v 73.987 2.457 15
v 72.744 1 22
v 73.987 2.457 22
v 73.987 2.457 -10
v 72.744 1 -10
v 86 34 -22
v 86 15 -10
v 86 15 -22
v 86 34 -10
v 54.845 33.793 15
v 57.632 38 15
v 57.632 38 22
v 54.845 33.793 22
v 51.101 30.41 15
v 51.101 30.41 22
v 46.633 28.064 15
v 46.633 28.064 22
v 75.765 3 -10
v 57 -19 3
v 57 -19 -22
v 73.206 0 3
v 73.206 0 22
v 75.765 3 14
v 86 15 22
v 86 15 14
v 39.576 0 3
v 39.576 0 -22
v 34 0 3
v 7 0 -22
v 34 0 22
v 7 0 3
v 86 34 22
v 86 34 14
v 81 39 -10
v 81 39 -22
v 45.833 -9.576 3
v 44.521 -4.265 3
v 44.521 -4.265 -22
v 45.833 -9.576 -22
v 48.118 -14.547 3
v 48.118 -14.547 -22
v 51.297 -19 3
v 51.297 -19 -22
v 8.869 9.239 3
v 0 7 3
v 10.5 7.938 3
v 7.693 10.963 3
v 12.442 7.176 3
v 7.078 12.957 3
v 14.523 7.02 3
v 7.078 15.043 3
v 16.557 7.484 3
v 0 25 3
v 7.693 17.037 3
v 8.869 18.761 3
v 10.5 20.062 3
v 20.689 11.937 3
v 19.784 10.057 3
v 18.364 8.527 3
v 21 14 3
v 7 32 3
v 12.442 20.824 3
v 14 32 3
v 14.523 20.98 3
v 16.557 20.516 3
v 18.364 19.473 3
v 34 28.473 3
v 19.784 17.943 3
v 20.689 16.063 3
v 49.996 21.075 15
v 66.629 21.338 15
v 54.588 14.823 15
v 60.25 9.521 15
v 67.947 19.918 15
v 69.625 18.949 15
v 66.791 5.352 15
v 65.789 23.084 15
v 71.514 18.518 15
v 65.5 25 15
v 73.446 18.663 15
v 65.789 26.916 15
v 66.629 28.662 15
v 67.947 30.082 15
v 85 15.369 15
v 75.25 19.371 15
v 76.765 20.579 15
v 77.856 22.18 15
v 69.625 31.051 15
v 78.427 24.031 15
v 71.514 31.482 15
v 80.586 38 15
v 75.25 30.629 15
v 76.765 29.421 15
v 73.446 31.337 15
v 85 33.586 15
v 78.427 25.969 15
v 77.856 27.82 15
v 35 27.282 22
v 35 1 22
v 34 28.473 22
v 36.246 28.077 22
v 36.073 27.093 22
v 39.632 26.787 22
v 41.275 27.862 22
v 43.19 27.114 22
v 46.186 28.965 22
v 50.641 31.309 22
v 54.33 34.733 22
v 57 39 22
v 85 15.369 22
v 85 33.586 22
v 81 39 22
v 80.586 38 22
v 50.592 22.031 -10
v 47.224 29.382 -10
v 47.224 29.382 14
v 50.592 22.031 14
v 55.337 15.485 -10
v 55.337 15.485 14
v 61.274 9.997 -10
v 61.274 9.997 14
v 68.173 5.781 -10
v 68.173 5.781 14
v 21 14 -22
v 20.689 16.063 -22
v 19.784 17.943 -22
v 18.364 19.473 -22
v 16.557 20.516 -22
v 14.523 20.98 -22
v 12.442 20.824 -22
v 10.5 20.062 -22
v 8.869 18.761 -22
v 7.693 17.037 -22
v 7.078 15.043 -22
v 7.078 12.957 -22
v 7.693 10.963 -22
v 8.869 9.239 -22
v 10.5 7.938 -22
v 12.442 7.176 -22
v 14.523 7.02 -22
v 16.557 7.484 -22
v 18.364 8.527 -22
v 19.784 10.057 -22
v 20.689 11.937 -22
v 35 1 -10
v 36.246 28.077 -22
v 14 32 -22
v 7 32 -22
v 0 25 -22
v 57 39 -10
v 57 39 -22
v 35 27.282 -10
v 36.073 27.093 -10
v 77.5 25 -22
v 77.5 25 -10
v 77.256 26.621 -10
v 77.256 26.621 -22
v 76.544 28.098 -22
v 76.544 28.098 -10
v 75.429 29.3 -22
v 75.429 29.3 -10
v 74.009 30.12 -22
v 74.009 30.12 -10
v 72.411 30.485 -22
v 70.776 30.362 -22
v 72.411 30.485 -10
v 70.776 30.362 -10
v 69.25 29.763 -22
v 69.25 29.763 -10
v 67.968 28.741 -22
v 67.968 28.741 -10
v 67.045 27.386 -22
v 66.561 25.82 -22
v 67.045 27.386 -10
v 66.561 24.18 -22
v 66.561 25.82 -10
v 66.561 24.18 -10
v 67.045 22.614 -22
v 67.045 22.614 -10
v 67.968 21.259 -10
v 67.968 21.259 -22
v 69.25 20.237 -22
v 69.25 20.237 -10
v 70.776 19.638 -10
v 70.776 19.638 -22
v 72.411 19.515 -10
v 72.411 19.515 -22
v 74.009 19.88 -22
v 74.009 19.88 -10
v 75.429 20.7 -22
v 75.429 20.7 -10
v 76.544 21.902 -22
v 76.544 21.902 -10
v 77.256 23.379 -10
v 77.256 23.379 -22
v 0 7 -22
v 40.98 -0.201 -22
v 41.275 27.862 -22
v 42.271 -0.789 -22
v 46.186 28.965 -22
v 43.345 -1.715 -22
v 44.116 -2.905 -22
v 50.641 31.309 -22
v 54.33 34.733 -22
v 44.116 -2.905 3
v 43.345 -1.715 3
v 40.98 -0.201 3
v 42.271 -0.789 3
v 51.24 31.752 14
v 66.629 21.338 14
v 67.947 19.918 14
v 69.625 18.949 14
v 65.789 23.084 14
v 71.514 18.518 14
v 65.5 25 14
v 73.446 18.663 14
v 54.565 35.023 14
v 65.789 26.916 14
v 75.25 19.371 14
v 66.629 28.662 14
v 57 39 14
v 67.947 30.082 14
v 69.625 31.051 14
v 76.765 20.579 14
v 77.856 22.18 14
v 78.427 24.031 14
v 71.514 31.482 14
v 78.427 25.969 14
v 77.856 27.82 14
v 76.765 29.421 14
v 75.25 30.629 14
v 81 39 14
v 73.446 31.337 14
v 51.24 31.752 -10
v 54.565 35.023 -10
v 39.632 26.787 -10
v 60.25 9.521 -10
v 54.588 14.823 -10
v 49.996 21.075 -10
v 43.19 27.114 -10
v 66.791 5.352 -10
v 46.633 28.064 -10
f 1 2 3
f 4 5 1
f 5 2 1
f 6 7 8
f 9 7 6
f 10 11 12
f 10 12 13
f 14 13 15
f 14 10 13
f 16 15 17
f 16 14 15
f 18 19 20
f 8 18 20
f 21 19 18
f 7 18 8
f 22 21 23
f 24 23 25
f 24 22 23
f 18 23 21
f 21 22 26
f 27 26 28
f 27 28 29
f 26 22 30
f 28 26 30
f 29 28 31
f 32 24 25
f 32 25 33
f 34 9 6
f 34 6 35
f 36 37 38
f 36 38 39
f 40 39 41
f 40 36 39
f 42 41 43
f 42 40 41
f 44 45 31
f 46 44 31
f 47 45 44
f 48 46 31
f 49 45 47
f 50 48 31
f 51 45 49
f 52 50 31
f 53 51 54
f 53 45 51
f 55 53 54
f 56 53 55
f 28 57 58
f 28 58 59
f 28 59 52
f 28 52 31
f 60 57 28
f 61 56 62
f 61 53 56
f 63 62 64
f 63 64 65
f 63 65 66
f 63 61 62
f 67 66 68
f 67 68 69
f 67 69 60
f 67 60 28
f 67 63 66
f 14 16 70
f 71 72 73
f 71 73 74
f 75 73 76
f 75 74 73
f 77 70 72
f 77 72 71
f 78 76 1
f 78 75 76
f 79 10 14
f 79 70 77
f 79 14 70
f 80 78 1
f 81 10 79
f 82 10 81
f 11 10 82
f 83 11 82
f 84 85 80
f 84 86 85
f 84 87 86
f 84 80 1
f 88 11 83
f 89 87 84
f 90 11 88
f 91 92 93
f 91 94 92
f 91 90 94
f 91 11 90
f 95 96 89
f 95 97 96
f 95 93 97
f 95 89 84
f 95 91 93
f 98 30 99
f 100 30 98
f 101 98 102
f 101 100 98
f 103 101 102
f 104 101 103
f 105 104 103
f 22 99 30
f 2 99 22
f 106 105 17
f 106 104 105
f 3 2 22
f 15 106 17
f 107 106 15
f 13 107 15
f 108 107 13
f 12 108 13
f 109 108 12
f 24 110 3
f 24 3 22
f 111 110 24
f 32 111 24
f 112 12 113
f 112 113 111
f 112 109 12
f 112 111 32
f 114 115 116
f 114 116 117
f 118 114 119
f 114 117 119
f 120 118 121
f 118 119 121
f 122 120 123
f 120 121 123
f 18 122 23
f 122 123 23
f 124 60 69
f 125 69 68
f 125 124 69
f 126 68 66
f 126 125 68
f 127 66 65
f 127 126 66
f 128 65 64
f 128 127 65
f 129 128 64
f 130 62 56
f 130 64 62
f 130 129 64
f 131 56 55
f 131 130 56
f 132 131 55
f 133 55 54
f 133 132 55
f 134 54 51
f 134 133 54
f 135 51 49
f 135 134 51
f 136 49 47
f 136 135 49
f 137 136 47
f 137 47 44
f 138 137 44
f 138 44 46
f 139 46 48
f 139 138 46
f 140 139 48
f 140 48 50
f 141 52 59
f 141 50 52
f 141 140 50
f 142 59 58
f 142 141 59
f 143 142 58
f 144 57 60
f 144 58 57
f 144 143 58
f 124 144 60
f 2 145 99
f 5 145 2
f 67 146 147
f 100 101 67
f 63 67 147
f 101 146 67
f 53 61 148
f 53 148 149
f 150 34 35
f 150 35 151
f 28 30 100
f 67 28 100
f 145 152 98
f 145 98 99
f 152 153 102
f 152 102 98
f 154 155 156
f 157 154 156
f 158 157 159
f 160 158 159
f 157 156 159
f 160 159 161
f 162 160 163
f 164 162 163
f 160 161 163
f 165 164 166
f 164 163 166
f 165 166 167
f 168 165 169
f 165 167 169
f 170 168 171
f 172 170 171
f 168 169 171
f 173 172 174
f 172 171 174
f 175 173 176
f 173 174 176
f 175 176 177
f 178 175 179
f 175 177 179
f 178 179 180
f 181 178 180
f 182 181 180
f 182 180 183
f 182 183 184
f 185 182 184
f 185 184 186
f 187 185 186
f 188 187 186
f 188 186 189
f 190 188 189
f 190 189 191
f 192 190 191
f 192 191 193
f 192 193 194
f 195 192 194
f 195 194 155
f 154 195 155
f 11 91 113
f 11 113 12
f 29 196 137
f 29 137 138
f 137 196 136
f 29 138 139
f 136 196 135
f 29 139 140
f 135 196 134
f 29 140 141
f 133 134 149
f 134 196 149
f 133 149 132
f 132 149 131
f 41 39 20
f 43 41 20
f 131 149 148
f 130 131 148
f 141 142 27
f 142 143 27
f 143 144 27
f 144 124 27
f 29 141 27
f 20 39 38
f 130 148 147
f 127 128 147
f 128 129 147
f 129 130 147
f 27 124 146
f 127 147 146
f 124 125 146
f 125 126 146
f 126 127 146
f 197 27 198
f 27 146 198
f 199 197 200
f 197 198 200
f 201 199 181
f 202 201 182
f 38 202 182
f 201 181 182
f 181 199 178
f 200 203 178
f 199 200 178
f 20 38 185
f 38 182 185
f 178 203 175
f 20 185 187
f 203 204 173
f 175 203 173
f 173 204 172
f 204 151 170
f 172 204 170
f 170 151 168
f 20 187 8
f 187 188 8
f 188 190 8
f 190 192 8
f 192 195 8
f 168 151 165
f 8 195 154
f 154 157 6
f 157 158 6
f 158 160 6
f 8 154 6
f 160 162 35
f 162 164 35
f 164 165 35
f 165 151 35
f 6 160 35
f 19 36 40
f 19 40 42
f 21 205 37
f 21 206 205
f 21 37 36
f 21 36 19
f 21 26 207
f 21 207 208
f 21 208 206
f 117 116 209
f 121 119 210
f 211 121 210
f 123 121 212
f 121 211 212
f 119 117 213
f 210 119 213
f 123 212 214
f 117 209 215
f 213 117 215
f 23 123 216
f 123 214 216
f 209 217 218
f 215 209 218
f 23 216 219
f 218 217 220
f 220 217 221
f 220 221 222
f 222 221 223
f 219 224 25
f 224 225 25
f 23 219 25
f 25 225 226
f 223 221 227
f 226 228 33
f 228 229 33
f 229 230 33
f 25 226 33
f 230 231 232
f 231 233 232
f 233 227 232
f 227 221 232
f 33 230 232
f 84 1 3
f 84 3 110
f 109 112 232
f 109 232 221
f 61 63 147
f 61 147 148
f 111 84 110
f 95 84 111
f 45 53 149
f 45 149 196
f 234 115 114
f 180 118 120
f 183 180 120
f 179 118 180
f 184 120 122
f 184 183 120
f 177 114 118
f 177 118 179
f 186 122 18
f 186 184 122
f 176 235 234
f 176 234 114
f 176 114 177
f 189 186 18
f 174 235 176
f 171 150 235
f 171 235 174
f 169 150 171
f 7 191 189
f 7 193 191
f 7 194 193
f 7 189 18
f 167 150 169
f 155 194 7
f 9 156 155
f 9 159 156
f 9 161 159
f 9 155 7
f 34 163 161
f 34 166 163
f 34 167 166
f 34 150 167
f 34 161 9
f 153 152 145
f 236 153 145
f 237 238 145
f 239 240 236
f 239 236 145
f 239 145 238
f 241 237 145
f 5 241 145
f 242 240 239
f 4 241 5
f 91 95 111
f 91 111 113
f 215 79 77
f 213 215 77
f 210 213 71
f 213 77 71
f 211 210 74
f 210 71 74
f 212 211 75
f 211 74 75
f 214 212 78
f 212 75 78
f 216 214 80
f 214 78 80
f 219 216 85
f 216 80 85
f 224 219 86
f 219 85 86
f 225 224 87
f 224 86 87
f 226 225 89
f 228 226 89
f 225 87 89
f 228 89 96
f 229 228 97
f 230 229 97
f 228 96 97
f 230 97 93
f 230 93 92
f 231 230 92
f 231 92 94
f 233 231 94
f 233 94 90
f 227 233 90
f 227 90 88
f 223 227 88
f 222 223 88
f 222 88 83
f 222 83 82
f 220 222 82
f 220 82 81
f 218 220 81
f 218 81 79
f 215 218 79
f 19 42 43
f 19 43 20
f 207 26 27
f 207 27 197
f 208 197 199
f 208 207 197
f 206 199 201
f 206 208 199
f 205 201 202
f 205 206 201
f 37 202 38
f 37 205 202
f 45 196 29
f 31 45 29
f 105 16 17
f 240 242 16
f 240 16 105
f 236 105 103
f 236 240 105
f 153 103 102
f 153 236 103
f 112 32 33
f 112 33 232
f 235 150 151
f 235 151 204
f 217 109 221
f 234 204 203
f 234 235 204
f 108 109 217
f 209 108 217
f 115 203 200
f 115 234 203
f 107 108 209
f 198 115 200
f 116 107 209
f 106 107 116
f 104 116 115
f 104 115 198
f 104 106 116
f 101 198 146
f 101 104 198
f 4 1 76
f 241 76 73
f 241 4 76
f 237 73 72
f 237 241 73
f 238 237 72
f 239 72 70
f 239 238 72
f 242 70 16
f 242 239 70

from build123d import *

# Parameters (mm, degrees)
ESQUISSE2_R             = 7
BOSS_EXTRU_2_DEPTH      = 22
ENL_V_MAT_EXTRU_1_DEPTH = 19
ESQUISSE5_R             = 5.5
ENL_V_MAT_EXTRU_2_DEPTH = 105.177732746
ENL_V_START             = -36
ENL_V_MAT_EXTRU_3_DEPTH = 24
COQUE1_START            = 3
COQUE1_DEPTH            = 19
COQUE1_START_2          = 15
COQUE1_2_OUTLINE_R      = 6.5
COQUE1_2_DEPTH          = 7
ENL_V_MAT_EXTRU_4_REACH = 106.178
ESQUISSE16_R            = 6.5
ENL_V_START_2           = -13
ENL_V_MAT_EXTRU_5_DEPTH = 13


# Read off the part's stored shape, not the designer's step: Coque1
with BuildPart() as part:
    # Esquisse2 → Boss.-Extru.2 (new, symmetric)
    with BuildSketch(Plane.XY):
        with BuildLine():
            Line((51.296980053, -19), (57, -19))
            Line((57, -19), (86, 15))
            Line((86, 15), (86, 34))
            Line((86, 34), (81, 39))
            Line((81, 39), (57, 39))
            ThreePointArc((57, 39), (48.490791592, 29.99016727), (36.246410316, 28.077357637))
            Line((36.246410316, 28.077357637), (14, 32))
            Line((14, 32), (7, 32))
            Line((7, 32), (0, 25))
            Line((0, 25), (0, 7))
            Line((0, 7), (7, 0))
            Line((7, 0), (39.575538911, 0))
            ThreePointArc((39.575538911, 0), (42.840774692, -1.213413768), (44.521177653, -4.264705882))
            ThreePointArc((44.521177653, -4.264705882), (46.858007856, -12.115672061), (51.296980053, -19))
        make_face()
        with Locations((14, 14)):
            Circle(ESQUISSE2_R, mode=Mode.SUBTRACT)
    extrude(amount=BOSS_EXTRU_2_DEPTH, both=True)

    # Esquisse4 → Enlèv. mat.-Extru.1 (cut)
    with BuildSketch(Plane.XY.offset(22)):
        Polygon((34, 32), (0, 32), (0, -19), (86, -19), (86, 0), (34, 0), align=None)
    extrude(amount=-ENL_V_MAT_EXTRU_1_DEPTH, mode=Mode.SUBTRACT)

    # Esquisse5 → Enlèv. mat.-Extru.2 (cut, through all)
    with BuildSketch(Plane.XY.offset(22)):
        with Locations((72, 25)):
            Circle(ESQUISSE5_R)
    extrude(amount=-ENL_V_MAT_EXTRU_2_DEPTH, mode=Mode.SUBTRACT)

    # Esquisse14 → Enlèv. mat.-Extru.3 (cut)
    with BuildSketch(Plane(origin=(0, 0, -22), x_dir=(-1, 0, 0), z_dir=(0, 0, -1)).offset(ENL_V_START)):
        with BuildLine():
            Line((-75.764705882, 3), (-86, 15))
            Line((-86, 15), (-86, 34))
            Line((-86, 34), (-81, 39))
            Line((-81, 39), (-57, 39))
            ThreePointArc((-57, 39), (-53.002548038, 33.285750119), (-47.224051208, 29.381745985))
            ThreePointArc((-47.224051208, 29.381745985), (-58.169717695, 12.59414375), (-75.764705882, 3))
        make_face()
    extrude(amount=ENL_V_MAT_EXTRU_3_DEPTH, mode=Mode.SUBTRACT)

    # Coque1 outline → Coque1 (cut)
    with BuildSketch(Plane.XY.offset(COQUE1_START)):
        with BuildLine():
            Line((72.744476296, 1), (73.986847747, 2.456573425))
            ThreePointArc((73.986847747, 2.456573425), (57.296143365, 12.041008897), (46.63326541, 28.064243583))
            ThreePointArc((46.63326541, 28.064243583), (41.418086005, 26.871182604), (36.072762138, 27.092549884))
            Line((36.072762138, 27.092549884), (35, 27.281706793))
            Line((35, 27.281706793), (35, 1))
            Line((35, 1), (72.744476296, 1))
        make_face()
    extrude(amount=COQUE1_DEPTH, mode=Mode.SUBTRACT)

    # Coque1 2 outline → Coque1 2 (cut)
    with BuildSketch(Plane.XY.offset(COQUE1_START_2)):
        with BuildLine():
            Line((73.986847747, 2.456573425), (85, 15.368545033))
            Line((85, 15.368545033), (85, 33.585786438))
            Line((85, 33.585786438), (80.585786438, 38))
            Line((80.585786438, 38), (57.631958739, 38))
            ThreePointArc((57.631958739, 38), (53.079347815, 31.984103338), (46.63326541, 28.064243583))
            ThreePointArc((46.63326541, 28.064243583), (57.296143365, 12.041008897), (73.986847747, 2.456573425))
        make_face()
        with Locations((72, 25)):
            Circle(COQUE1_2_OUTLINE_R, mode=Mode.SUBTRACT)
    extrude(amount=COQUE1_2_DEPTH, mode=Mode.SUBTRACT)

    # Esquisse16 → Enlèv. mat.-Extru.4 (cut, up to next)
    with BuildSketch(Plane.XY.offset(22), mode=Mode.PRIVATE) as enl_v_mat_extru_4_sk1:
        with Locations(Location((72, 25, 0), (0, 0, 180))):
            Circle(ESQUISSE16_R)
    enl_v_mat_extru_4_tool1 = extrude(enl_v_mat_extru_4_sk1.sketch, amount=-ENL_V_MAT_EXTRU_4_REACH, mode=Mode.PRIVATE) & part.part
    add(enl_v_mat_extru_4_tool1.solids().sort_by_distance((72, 25, 22))[0], mode=Mode.SUBTRACT)

    # Esquisse17 → Enlèv. mat.-Extru.5 (cut)
    with BuildSketch(Plane.XY.offset(3).offset(ENL_V_START_2)):
        with BuildLine():
            Line((72.744476296, 1), (73.986847747, 2.456573425))
            ThreePointArc((73.986847747, 2.456573425), (57.296143365, 12.041008897), (46.63326541, 28.064243583))
            ThreePointArc((46.63326541, 28.064243583), (41.418086005, 26.871182604), (36.072762138, 27.092549884))
            Line((36.072762138, 27.092549884), (35, 27.281706793))
            Line((35, 27.281706793), (35, 1))
            Line((35, 1), (72.744476296, 1))
        make_face()
    extrude(amount=ENL_V_MAT_EXTRU_5_DEPTH, mode=Mode.SUBTRACT)


solid = part.part
